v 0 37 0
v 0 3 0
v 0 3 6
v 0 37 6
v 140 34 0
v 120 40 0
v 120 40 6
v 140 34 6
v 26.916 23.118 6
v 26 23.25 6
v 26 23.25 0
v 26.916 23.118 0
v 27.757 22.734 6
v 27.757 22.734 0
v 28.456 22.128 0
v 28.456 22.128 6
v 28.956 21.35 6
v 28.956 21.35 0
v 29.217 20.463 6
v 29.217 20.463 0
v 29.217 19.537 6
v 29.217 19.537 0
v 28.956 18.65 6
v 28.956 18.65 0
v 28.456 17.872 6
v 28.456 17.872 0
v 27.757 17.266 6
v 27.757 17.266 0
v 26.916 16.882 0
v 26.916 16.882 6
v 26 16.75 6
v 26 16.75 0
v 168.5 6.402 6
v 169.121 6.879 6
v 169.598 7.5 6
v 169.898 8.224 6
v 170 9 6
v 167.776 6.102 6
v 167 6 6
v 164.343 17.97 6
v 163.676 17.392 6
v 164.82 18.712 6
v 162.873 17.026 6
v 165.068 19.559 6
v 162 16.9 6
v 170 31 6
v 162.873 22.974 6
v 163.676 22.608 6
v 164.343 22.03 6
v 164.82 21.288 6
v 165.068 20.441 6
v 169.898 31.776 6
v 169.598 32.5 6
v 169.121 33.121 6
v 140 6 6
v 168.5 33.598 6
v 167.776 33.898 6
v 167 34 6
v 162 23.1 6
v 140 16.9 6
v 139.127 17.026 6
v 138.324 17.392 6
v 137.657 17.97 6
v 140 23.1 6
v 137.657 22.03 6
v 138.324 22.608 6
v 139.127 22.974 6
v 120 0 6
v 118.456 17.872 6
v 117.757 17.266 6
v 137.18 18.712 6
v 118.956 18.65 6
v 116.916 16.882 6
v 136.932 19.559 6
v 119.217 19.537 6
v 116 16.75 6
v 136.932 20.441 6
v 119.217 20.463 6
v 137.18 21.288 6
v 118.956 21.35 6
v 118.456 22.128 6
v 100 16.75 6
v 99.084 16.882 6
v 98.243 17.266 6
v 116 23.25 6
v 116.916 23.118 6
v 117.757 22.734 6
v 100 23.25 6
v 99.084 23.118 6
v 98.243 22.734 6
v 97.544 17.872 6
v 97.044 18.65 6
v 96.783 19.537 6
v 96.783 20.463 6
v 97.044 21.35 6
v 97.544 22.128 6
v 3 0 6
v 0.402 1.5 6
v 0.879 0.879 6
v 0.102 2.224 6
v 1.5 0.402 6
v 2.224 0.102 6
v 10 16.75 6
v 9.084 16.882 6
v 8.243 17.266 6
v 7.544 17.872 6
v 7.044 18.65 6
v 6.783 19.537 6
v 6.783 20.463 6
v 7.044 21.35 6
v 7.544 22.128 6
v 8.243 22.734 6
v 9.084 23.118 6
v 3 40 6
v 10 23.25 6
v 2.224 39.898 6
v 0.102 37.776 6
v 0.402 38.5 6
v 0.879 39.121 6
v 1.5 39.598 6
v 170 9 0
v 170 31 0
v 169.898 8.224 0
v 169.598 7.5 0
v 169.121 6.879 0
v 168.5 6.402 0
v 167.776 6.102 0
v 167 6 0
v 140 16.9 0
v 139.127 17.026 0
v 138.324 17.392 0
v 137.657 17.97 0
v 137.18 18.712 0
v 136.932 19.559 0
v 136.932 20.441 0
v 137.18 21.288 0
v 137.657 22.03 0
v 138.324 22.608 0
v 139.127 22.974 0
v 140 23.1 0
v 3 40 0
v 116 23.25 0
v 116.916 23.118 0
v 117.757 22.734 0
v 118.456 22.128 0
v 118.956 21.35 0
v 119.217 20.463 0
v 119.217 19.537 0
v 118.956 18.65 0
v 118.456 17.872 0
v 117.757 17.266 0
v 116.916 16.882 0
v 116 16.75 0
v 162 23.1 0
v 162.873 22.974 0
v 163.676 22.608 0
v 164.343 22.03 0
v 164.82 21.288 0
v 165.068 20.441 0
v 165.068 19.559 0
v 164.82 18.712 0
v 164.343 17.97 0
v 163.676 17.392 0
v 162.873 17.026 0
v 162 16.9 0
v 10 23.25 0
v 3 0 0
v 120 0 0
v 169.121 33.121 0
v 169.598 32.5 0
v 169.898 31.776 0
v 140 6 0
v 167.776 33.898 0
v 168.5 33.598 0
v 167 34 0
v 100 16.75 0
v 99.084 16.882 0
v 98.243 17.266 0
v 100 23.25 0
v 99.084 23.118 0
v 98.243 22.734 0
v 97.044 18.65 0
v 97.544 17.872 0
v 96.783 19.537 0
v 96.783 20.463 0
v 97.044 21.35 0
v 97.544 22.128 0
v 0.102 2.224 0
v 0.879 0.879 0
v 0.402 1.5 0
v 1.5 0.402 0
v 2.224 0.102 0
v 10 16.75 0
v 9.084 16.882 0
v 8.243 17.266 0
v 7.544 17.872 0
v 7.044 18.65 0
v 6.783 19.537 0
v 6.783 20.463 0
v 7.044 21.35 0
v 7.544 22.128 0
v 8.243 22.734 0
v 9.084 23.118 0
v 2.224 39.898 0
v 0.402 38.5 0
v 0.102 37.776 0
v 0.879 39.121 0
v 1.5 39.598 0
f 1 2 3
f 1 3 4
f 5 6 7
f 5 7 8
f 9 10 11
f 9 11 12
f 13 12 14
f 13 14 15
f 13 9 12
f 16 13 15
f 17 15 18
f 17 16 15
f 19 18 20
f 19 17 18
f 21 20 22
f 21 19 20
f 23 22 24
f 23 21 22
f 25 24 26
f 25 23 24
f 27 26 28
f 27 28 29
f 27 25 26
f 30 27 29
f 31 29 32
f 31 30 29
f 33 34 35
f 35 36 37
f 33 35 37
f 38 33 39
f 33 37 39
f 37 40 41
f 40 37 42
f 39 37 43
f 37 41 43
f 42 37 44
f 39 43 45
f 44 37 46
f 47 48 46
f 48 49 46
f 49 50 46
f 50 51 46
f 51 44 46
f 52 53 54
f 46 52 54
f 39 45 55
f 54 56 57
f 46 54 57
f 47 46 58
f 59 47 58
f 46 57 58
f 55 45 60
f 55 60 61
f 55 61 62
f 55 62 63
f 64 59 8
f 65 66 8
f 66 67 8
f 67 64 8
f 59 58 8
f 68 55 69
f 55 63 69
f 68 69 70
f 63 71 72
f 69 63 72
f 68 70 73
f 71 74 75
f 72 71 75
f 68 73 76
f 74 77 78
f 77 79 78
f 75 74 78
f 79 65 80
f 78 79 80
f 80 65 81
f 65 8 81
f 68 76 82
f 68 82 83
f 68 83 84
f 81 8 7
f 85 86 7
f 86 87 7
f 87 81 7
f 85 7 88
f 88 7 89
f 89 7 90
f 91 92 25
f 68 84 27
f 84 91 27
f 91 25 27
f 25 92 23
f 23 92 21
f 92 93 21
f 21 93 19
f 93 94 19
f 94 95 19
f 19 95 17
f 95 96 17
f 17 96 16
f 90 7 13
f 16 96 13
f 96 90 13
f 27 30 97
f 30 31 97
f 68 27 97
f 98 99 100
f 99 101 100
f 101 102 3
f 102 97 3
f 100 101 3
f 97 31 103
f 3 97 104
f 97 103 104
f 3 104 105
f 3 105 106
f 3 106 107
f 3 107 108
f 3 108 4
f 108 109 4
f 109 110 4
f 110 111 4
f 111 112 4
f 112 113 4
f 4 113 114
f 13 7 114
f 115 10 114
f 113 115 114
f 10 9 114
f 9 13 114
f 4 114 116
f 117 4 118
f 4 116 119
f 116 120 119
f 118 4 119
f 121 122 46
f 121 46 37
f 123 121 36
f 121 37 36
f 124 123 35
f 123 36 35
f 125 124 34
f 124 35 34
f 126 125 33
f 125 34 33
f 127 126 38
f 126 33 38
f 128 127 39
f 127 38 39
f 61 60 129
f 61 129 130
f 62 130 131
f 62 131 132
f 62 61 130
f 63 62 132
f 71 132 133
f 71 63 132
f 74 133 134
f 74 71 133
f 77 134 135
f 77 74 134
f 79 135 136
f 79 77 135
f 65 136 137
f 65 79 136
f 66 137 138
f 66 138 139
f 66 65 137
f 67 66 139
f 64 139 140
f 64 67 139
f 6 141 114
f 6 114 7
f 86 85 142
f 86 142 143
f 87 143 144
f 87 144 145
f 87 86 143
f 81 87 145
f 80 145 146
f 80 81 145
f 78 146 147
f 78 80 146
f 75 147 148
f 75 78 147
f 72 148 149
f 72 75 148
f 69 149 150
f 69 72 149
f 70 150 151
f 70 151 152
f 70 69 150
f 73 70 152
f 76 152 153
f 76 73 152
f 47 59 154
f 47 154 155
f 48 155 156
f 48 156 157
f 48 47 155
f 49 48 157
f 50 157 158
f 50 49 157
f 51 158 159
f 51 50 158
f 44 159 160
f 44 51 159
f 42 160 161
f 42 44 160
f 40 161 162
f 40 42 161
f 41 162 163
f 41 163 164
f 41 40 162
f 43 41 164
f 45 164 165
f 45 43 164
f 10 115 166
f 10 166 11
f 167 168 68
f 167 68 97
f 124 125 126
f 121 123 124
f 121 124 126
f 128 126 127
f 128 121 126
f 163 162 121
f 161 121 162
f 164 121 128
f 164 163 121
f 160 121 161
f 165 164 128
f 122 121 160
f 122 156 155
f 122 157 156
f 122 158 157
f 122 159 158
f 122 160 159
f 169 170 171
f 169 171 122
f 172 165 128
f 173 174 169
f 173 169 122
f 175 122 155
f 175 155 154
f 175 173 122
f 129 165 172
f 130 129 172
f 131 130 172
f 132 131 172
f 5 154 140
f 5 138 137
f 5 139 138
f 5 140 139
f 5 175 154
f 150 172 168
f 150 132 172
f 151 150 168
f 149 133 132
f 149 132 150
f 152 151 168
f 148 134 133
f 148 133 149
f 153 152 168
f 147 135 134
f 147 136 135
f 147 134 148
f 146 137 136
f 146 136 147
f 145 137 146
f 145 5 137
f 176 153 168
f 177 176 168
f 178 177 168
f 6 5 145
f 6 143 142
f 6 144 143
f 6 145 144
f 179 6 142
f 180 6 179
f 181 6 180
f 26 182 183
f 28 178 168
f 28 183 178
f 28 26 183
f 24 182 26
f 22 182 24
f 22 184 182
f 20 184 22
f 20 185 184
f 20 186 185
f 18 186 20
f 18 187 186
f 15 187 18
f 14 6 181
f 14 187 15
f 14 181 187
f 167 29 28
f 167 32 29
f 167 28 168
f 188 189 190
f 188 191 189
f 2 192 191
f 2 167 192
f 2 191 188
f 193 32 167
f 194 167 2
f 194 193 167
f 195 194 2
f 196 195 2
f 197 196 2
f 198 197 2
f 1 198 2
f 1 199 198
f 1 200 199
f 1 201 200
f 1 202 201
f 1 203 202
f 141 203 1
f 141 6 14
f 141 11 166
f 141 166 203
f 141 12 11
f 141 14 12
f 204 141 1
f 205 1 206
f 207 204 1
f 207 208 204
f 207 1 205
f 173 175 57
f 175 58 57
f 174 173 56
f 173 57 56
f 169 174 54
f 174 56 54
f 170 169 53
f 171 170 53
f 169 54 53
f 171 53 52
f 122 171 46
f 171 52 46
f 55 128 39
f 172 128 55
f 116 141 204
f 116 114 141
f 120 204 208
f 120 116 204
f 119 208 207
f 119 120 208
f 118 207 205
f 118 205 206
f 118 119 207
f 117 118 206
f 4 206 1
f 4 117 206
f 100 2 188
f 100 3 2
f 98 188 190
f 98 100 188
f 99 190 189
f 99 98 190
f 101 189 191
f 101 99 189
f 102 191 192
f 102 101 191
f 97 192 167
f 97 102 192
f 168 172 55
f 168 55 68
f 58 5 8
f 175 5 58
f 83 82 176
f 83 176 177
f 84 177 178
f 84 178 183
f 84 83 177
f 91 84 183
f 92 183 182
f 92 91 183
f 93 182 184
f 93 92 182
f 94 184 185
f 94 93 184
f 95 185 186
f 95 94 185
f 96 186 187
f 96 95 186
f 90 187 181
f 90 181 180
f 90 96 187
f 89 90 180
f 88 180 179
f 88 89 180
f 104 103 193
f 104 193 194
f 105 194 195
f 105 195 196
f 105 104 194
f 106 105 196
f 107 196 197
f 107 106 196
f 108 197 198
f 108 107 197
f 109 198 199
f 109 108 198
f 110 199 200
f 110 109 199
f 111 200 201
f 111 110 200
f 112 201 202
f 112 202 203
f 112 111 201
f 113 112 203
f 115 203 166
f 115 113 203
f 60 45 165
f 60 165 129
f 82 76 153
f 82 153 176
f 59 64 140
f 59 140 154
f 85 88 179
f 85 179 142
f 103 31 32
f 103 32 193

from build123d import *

# Parameters (mm, degrees)
EXTRUDE_1_DEPTH        = 6
CUT_EXTRUDE_1_DEPTH    = 6
CUT_EXTRUDE_2_DEPTH    = 6
PATTERN_LINEAR_1_COUNT = 2
PATTERN_LINEAR_1_PITCH = 90
FILLET_1_R             = 3


with BuildPart() as part:
    # 草图1 → 凸台-拉伸1 (new body)
    with BuildSketch(Plane.XY):
        Polygon((120, 40), (140, 34), (170, 34), (170, 6), (140, 6), (120, 0), (0, 0), (0, 40), align=None)
    extrude(amount=EXTRUDE_1_DEPTH)

    # 草图2 → 切除-拉伸1 (cut)
    with BuildSketch(Plane.XY.offset(6)):
        with BuildLine():
            Line((10, 23.25), (26, 23.25))
            ThreePointArc((26, 23.25), (29.25, 20), (26, 16.75))
            Line((26, 16.75), (10, 16.75))
            ThreePointArc((10, 16.75), (6.75, 20), (10, 23.25))
        make_face()
    cut_extrude_1 = extrude(amount=-CUT_EXTRUDE_1_DEPTH, mode=Mode.SUBTRACT)

    # 草图3 → 切除-拉伸2 (cut)
    with BuildSketch(Plane.XY.offset(6)):
        with BuildLine():
            Line((140, 23.1), (162, 23.1))
            ThreePointArc((162, 23.1), (165.1, 20), (162, 16.9))
            Line((162, 16.9), (140, 16.9))
            ThreePointArc((140, 16.9), (136.9, 20), (140, 23.1))
        make_face()
    extrude(amount=-CUT_EXTRUDE_2_DEPTH, mode=Mode.SUBTRACT)

    # 阵列(线性)1: 切除-拉伸1 ×2
    with Locations(*[(i * PATTERN_LINEAR_1_PITCH, 0, 0) for i in range(1, PATTERN_LINEAR_1_COUNT)]):
        add(cut_extrude_1, mode=Mode.SUBTRACT)

    # 圆角1
    fillet_1_edges = [part.edges().sort_by_distance(p)[0] for p in [
        (0, 40, 3),
        (170, 34, 3),
        (170, 6, 3),
        (0, 0, 3),
    ]]
    fillet(fillet_1_edges, radius=FILLET_1_R)


solid = part.part
